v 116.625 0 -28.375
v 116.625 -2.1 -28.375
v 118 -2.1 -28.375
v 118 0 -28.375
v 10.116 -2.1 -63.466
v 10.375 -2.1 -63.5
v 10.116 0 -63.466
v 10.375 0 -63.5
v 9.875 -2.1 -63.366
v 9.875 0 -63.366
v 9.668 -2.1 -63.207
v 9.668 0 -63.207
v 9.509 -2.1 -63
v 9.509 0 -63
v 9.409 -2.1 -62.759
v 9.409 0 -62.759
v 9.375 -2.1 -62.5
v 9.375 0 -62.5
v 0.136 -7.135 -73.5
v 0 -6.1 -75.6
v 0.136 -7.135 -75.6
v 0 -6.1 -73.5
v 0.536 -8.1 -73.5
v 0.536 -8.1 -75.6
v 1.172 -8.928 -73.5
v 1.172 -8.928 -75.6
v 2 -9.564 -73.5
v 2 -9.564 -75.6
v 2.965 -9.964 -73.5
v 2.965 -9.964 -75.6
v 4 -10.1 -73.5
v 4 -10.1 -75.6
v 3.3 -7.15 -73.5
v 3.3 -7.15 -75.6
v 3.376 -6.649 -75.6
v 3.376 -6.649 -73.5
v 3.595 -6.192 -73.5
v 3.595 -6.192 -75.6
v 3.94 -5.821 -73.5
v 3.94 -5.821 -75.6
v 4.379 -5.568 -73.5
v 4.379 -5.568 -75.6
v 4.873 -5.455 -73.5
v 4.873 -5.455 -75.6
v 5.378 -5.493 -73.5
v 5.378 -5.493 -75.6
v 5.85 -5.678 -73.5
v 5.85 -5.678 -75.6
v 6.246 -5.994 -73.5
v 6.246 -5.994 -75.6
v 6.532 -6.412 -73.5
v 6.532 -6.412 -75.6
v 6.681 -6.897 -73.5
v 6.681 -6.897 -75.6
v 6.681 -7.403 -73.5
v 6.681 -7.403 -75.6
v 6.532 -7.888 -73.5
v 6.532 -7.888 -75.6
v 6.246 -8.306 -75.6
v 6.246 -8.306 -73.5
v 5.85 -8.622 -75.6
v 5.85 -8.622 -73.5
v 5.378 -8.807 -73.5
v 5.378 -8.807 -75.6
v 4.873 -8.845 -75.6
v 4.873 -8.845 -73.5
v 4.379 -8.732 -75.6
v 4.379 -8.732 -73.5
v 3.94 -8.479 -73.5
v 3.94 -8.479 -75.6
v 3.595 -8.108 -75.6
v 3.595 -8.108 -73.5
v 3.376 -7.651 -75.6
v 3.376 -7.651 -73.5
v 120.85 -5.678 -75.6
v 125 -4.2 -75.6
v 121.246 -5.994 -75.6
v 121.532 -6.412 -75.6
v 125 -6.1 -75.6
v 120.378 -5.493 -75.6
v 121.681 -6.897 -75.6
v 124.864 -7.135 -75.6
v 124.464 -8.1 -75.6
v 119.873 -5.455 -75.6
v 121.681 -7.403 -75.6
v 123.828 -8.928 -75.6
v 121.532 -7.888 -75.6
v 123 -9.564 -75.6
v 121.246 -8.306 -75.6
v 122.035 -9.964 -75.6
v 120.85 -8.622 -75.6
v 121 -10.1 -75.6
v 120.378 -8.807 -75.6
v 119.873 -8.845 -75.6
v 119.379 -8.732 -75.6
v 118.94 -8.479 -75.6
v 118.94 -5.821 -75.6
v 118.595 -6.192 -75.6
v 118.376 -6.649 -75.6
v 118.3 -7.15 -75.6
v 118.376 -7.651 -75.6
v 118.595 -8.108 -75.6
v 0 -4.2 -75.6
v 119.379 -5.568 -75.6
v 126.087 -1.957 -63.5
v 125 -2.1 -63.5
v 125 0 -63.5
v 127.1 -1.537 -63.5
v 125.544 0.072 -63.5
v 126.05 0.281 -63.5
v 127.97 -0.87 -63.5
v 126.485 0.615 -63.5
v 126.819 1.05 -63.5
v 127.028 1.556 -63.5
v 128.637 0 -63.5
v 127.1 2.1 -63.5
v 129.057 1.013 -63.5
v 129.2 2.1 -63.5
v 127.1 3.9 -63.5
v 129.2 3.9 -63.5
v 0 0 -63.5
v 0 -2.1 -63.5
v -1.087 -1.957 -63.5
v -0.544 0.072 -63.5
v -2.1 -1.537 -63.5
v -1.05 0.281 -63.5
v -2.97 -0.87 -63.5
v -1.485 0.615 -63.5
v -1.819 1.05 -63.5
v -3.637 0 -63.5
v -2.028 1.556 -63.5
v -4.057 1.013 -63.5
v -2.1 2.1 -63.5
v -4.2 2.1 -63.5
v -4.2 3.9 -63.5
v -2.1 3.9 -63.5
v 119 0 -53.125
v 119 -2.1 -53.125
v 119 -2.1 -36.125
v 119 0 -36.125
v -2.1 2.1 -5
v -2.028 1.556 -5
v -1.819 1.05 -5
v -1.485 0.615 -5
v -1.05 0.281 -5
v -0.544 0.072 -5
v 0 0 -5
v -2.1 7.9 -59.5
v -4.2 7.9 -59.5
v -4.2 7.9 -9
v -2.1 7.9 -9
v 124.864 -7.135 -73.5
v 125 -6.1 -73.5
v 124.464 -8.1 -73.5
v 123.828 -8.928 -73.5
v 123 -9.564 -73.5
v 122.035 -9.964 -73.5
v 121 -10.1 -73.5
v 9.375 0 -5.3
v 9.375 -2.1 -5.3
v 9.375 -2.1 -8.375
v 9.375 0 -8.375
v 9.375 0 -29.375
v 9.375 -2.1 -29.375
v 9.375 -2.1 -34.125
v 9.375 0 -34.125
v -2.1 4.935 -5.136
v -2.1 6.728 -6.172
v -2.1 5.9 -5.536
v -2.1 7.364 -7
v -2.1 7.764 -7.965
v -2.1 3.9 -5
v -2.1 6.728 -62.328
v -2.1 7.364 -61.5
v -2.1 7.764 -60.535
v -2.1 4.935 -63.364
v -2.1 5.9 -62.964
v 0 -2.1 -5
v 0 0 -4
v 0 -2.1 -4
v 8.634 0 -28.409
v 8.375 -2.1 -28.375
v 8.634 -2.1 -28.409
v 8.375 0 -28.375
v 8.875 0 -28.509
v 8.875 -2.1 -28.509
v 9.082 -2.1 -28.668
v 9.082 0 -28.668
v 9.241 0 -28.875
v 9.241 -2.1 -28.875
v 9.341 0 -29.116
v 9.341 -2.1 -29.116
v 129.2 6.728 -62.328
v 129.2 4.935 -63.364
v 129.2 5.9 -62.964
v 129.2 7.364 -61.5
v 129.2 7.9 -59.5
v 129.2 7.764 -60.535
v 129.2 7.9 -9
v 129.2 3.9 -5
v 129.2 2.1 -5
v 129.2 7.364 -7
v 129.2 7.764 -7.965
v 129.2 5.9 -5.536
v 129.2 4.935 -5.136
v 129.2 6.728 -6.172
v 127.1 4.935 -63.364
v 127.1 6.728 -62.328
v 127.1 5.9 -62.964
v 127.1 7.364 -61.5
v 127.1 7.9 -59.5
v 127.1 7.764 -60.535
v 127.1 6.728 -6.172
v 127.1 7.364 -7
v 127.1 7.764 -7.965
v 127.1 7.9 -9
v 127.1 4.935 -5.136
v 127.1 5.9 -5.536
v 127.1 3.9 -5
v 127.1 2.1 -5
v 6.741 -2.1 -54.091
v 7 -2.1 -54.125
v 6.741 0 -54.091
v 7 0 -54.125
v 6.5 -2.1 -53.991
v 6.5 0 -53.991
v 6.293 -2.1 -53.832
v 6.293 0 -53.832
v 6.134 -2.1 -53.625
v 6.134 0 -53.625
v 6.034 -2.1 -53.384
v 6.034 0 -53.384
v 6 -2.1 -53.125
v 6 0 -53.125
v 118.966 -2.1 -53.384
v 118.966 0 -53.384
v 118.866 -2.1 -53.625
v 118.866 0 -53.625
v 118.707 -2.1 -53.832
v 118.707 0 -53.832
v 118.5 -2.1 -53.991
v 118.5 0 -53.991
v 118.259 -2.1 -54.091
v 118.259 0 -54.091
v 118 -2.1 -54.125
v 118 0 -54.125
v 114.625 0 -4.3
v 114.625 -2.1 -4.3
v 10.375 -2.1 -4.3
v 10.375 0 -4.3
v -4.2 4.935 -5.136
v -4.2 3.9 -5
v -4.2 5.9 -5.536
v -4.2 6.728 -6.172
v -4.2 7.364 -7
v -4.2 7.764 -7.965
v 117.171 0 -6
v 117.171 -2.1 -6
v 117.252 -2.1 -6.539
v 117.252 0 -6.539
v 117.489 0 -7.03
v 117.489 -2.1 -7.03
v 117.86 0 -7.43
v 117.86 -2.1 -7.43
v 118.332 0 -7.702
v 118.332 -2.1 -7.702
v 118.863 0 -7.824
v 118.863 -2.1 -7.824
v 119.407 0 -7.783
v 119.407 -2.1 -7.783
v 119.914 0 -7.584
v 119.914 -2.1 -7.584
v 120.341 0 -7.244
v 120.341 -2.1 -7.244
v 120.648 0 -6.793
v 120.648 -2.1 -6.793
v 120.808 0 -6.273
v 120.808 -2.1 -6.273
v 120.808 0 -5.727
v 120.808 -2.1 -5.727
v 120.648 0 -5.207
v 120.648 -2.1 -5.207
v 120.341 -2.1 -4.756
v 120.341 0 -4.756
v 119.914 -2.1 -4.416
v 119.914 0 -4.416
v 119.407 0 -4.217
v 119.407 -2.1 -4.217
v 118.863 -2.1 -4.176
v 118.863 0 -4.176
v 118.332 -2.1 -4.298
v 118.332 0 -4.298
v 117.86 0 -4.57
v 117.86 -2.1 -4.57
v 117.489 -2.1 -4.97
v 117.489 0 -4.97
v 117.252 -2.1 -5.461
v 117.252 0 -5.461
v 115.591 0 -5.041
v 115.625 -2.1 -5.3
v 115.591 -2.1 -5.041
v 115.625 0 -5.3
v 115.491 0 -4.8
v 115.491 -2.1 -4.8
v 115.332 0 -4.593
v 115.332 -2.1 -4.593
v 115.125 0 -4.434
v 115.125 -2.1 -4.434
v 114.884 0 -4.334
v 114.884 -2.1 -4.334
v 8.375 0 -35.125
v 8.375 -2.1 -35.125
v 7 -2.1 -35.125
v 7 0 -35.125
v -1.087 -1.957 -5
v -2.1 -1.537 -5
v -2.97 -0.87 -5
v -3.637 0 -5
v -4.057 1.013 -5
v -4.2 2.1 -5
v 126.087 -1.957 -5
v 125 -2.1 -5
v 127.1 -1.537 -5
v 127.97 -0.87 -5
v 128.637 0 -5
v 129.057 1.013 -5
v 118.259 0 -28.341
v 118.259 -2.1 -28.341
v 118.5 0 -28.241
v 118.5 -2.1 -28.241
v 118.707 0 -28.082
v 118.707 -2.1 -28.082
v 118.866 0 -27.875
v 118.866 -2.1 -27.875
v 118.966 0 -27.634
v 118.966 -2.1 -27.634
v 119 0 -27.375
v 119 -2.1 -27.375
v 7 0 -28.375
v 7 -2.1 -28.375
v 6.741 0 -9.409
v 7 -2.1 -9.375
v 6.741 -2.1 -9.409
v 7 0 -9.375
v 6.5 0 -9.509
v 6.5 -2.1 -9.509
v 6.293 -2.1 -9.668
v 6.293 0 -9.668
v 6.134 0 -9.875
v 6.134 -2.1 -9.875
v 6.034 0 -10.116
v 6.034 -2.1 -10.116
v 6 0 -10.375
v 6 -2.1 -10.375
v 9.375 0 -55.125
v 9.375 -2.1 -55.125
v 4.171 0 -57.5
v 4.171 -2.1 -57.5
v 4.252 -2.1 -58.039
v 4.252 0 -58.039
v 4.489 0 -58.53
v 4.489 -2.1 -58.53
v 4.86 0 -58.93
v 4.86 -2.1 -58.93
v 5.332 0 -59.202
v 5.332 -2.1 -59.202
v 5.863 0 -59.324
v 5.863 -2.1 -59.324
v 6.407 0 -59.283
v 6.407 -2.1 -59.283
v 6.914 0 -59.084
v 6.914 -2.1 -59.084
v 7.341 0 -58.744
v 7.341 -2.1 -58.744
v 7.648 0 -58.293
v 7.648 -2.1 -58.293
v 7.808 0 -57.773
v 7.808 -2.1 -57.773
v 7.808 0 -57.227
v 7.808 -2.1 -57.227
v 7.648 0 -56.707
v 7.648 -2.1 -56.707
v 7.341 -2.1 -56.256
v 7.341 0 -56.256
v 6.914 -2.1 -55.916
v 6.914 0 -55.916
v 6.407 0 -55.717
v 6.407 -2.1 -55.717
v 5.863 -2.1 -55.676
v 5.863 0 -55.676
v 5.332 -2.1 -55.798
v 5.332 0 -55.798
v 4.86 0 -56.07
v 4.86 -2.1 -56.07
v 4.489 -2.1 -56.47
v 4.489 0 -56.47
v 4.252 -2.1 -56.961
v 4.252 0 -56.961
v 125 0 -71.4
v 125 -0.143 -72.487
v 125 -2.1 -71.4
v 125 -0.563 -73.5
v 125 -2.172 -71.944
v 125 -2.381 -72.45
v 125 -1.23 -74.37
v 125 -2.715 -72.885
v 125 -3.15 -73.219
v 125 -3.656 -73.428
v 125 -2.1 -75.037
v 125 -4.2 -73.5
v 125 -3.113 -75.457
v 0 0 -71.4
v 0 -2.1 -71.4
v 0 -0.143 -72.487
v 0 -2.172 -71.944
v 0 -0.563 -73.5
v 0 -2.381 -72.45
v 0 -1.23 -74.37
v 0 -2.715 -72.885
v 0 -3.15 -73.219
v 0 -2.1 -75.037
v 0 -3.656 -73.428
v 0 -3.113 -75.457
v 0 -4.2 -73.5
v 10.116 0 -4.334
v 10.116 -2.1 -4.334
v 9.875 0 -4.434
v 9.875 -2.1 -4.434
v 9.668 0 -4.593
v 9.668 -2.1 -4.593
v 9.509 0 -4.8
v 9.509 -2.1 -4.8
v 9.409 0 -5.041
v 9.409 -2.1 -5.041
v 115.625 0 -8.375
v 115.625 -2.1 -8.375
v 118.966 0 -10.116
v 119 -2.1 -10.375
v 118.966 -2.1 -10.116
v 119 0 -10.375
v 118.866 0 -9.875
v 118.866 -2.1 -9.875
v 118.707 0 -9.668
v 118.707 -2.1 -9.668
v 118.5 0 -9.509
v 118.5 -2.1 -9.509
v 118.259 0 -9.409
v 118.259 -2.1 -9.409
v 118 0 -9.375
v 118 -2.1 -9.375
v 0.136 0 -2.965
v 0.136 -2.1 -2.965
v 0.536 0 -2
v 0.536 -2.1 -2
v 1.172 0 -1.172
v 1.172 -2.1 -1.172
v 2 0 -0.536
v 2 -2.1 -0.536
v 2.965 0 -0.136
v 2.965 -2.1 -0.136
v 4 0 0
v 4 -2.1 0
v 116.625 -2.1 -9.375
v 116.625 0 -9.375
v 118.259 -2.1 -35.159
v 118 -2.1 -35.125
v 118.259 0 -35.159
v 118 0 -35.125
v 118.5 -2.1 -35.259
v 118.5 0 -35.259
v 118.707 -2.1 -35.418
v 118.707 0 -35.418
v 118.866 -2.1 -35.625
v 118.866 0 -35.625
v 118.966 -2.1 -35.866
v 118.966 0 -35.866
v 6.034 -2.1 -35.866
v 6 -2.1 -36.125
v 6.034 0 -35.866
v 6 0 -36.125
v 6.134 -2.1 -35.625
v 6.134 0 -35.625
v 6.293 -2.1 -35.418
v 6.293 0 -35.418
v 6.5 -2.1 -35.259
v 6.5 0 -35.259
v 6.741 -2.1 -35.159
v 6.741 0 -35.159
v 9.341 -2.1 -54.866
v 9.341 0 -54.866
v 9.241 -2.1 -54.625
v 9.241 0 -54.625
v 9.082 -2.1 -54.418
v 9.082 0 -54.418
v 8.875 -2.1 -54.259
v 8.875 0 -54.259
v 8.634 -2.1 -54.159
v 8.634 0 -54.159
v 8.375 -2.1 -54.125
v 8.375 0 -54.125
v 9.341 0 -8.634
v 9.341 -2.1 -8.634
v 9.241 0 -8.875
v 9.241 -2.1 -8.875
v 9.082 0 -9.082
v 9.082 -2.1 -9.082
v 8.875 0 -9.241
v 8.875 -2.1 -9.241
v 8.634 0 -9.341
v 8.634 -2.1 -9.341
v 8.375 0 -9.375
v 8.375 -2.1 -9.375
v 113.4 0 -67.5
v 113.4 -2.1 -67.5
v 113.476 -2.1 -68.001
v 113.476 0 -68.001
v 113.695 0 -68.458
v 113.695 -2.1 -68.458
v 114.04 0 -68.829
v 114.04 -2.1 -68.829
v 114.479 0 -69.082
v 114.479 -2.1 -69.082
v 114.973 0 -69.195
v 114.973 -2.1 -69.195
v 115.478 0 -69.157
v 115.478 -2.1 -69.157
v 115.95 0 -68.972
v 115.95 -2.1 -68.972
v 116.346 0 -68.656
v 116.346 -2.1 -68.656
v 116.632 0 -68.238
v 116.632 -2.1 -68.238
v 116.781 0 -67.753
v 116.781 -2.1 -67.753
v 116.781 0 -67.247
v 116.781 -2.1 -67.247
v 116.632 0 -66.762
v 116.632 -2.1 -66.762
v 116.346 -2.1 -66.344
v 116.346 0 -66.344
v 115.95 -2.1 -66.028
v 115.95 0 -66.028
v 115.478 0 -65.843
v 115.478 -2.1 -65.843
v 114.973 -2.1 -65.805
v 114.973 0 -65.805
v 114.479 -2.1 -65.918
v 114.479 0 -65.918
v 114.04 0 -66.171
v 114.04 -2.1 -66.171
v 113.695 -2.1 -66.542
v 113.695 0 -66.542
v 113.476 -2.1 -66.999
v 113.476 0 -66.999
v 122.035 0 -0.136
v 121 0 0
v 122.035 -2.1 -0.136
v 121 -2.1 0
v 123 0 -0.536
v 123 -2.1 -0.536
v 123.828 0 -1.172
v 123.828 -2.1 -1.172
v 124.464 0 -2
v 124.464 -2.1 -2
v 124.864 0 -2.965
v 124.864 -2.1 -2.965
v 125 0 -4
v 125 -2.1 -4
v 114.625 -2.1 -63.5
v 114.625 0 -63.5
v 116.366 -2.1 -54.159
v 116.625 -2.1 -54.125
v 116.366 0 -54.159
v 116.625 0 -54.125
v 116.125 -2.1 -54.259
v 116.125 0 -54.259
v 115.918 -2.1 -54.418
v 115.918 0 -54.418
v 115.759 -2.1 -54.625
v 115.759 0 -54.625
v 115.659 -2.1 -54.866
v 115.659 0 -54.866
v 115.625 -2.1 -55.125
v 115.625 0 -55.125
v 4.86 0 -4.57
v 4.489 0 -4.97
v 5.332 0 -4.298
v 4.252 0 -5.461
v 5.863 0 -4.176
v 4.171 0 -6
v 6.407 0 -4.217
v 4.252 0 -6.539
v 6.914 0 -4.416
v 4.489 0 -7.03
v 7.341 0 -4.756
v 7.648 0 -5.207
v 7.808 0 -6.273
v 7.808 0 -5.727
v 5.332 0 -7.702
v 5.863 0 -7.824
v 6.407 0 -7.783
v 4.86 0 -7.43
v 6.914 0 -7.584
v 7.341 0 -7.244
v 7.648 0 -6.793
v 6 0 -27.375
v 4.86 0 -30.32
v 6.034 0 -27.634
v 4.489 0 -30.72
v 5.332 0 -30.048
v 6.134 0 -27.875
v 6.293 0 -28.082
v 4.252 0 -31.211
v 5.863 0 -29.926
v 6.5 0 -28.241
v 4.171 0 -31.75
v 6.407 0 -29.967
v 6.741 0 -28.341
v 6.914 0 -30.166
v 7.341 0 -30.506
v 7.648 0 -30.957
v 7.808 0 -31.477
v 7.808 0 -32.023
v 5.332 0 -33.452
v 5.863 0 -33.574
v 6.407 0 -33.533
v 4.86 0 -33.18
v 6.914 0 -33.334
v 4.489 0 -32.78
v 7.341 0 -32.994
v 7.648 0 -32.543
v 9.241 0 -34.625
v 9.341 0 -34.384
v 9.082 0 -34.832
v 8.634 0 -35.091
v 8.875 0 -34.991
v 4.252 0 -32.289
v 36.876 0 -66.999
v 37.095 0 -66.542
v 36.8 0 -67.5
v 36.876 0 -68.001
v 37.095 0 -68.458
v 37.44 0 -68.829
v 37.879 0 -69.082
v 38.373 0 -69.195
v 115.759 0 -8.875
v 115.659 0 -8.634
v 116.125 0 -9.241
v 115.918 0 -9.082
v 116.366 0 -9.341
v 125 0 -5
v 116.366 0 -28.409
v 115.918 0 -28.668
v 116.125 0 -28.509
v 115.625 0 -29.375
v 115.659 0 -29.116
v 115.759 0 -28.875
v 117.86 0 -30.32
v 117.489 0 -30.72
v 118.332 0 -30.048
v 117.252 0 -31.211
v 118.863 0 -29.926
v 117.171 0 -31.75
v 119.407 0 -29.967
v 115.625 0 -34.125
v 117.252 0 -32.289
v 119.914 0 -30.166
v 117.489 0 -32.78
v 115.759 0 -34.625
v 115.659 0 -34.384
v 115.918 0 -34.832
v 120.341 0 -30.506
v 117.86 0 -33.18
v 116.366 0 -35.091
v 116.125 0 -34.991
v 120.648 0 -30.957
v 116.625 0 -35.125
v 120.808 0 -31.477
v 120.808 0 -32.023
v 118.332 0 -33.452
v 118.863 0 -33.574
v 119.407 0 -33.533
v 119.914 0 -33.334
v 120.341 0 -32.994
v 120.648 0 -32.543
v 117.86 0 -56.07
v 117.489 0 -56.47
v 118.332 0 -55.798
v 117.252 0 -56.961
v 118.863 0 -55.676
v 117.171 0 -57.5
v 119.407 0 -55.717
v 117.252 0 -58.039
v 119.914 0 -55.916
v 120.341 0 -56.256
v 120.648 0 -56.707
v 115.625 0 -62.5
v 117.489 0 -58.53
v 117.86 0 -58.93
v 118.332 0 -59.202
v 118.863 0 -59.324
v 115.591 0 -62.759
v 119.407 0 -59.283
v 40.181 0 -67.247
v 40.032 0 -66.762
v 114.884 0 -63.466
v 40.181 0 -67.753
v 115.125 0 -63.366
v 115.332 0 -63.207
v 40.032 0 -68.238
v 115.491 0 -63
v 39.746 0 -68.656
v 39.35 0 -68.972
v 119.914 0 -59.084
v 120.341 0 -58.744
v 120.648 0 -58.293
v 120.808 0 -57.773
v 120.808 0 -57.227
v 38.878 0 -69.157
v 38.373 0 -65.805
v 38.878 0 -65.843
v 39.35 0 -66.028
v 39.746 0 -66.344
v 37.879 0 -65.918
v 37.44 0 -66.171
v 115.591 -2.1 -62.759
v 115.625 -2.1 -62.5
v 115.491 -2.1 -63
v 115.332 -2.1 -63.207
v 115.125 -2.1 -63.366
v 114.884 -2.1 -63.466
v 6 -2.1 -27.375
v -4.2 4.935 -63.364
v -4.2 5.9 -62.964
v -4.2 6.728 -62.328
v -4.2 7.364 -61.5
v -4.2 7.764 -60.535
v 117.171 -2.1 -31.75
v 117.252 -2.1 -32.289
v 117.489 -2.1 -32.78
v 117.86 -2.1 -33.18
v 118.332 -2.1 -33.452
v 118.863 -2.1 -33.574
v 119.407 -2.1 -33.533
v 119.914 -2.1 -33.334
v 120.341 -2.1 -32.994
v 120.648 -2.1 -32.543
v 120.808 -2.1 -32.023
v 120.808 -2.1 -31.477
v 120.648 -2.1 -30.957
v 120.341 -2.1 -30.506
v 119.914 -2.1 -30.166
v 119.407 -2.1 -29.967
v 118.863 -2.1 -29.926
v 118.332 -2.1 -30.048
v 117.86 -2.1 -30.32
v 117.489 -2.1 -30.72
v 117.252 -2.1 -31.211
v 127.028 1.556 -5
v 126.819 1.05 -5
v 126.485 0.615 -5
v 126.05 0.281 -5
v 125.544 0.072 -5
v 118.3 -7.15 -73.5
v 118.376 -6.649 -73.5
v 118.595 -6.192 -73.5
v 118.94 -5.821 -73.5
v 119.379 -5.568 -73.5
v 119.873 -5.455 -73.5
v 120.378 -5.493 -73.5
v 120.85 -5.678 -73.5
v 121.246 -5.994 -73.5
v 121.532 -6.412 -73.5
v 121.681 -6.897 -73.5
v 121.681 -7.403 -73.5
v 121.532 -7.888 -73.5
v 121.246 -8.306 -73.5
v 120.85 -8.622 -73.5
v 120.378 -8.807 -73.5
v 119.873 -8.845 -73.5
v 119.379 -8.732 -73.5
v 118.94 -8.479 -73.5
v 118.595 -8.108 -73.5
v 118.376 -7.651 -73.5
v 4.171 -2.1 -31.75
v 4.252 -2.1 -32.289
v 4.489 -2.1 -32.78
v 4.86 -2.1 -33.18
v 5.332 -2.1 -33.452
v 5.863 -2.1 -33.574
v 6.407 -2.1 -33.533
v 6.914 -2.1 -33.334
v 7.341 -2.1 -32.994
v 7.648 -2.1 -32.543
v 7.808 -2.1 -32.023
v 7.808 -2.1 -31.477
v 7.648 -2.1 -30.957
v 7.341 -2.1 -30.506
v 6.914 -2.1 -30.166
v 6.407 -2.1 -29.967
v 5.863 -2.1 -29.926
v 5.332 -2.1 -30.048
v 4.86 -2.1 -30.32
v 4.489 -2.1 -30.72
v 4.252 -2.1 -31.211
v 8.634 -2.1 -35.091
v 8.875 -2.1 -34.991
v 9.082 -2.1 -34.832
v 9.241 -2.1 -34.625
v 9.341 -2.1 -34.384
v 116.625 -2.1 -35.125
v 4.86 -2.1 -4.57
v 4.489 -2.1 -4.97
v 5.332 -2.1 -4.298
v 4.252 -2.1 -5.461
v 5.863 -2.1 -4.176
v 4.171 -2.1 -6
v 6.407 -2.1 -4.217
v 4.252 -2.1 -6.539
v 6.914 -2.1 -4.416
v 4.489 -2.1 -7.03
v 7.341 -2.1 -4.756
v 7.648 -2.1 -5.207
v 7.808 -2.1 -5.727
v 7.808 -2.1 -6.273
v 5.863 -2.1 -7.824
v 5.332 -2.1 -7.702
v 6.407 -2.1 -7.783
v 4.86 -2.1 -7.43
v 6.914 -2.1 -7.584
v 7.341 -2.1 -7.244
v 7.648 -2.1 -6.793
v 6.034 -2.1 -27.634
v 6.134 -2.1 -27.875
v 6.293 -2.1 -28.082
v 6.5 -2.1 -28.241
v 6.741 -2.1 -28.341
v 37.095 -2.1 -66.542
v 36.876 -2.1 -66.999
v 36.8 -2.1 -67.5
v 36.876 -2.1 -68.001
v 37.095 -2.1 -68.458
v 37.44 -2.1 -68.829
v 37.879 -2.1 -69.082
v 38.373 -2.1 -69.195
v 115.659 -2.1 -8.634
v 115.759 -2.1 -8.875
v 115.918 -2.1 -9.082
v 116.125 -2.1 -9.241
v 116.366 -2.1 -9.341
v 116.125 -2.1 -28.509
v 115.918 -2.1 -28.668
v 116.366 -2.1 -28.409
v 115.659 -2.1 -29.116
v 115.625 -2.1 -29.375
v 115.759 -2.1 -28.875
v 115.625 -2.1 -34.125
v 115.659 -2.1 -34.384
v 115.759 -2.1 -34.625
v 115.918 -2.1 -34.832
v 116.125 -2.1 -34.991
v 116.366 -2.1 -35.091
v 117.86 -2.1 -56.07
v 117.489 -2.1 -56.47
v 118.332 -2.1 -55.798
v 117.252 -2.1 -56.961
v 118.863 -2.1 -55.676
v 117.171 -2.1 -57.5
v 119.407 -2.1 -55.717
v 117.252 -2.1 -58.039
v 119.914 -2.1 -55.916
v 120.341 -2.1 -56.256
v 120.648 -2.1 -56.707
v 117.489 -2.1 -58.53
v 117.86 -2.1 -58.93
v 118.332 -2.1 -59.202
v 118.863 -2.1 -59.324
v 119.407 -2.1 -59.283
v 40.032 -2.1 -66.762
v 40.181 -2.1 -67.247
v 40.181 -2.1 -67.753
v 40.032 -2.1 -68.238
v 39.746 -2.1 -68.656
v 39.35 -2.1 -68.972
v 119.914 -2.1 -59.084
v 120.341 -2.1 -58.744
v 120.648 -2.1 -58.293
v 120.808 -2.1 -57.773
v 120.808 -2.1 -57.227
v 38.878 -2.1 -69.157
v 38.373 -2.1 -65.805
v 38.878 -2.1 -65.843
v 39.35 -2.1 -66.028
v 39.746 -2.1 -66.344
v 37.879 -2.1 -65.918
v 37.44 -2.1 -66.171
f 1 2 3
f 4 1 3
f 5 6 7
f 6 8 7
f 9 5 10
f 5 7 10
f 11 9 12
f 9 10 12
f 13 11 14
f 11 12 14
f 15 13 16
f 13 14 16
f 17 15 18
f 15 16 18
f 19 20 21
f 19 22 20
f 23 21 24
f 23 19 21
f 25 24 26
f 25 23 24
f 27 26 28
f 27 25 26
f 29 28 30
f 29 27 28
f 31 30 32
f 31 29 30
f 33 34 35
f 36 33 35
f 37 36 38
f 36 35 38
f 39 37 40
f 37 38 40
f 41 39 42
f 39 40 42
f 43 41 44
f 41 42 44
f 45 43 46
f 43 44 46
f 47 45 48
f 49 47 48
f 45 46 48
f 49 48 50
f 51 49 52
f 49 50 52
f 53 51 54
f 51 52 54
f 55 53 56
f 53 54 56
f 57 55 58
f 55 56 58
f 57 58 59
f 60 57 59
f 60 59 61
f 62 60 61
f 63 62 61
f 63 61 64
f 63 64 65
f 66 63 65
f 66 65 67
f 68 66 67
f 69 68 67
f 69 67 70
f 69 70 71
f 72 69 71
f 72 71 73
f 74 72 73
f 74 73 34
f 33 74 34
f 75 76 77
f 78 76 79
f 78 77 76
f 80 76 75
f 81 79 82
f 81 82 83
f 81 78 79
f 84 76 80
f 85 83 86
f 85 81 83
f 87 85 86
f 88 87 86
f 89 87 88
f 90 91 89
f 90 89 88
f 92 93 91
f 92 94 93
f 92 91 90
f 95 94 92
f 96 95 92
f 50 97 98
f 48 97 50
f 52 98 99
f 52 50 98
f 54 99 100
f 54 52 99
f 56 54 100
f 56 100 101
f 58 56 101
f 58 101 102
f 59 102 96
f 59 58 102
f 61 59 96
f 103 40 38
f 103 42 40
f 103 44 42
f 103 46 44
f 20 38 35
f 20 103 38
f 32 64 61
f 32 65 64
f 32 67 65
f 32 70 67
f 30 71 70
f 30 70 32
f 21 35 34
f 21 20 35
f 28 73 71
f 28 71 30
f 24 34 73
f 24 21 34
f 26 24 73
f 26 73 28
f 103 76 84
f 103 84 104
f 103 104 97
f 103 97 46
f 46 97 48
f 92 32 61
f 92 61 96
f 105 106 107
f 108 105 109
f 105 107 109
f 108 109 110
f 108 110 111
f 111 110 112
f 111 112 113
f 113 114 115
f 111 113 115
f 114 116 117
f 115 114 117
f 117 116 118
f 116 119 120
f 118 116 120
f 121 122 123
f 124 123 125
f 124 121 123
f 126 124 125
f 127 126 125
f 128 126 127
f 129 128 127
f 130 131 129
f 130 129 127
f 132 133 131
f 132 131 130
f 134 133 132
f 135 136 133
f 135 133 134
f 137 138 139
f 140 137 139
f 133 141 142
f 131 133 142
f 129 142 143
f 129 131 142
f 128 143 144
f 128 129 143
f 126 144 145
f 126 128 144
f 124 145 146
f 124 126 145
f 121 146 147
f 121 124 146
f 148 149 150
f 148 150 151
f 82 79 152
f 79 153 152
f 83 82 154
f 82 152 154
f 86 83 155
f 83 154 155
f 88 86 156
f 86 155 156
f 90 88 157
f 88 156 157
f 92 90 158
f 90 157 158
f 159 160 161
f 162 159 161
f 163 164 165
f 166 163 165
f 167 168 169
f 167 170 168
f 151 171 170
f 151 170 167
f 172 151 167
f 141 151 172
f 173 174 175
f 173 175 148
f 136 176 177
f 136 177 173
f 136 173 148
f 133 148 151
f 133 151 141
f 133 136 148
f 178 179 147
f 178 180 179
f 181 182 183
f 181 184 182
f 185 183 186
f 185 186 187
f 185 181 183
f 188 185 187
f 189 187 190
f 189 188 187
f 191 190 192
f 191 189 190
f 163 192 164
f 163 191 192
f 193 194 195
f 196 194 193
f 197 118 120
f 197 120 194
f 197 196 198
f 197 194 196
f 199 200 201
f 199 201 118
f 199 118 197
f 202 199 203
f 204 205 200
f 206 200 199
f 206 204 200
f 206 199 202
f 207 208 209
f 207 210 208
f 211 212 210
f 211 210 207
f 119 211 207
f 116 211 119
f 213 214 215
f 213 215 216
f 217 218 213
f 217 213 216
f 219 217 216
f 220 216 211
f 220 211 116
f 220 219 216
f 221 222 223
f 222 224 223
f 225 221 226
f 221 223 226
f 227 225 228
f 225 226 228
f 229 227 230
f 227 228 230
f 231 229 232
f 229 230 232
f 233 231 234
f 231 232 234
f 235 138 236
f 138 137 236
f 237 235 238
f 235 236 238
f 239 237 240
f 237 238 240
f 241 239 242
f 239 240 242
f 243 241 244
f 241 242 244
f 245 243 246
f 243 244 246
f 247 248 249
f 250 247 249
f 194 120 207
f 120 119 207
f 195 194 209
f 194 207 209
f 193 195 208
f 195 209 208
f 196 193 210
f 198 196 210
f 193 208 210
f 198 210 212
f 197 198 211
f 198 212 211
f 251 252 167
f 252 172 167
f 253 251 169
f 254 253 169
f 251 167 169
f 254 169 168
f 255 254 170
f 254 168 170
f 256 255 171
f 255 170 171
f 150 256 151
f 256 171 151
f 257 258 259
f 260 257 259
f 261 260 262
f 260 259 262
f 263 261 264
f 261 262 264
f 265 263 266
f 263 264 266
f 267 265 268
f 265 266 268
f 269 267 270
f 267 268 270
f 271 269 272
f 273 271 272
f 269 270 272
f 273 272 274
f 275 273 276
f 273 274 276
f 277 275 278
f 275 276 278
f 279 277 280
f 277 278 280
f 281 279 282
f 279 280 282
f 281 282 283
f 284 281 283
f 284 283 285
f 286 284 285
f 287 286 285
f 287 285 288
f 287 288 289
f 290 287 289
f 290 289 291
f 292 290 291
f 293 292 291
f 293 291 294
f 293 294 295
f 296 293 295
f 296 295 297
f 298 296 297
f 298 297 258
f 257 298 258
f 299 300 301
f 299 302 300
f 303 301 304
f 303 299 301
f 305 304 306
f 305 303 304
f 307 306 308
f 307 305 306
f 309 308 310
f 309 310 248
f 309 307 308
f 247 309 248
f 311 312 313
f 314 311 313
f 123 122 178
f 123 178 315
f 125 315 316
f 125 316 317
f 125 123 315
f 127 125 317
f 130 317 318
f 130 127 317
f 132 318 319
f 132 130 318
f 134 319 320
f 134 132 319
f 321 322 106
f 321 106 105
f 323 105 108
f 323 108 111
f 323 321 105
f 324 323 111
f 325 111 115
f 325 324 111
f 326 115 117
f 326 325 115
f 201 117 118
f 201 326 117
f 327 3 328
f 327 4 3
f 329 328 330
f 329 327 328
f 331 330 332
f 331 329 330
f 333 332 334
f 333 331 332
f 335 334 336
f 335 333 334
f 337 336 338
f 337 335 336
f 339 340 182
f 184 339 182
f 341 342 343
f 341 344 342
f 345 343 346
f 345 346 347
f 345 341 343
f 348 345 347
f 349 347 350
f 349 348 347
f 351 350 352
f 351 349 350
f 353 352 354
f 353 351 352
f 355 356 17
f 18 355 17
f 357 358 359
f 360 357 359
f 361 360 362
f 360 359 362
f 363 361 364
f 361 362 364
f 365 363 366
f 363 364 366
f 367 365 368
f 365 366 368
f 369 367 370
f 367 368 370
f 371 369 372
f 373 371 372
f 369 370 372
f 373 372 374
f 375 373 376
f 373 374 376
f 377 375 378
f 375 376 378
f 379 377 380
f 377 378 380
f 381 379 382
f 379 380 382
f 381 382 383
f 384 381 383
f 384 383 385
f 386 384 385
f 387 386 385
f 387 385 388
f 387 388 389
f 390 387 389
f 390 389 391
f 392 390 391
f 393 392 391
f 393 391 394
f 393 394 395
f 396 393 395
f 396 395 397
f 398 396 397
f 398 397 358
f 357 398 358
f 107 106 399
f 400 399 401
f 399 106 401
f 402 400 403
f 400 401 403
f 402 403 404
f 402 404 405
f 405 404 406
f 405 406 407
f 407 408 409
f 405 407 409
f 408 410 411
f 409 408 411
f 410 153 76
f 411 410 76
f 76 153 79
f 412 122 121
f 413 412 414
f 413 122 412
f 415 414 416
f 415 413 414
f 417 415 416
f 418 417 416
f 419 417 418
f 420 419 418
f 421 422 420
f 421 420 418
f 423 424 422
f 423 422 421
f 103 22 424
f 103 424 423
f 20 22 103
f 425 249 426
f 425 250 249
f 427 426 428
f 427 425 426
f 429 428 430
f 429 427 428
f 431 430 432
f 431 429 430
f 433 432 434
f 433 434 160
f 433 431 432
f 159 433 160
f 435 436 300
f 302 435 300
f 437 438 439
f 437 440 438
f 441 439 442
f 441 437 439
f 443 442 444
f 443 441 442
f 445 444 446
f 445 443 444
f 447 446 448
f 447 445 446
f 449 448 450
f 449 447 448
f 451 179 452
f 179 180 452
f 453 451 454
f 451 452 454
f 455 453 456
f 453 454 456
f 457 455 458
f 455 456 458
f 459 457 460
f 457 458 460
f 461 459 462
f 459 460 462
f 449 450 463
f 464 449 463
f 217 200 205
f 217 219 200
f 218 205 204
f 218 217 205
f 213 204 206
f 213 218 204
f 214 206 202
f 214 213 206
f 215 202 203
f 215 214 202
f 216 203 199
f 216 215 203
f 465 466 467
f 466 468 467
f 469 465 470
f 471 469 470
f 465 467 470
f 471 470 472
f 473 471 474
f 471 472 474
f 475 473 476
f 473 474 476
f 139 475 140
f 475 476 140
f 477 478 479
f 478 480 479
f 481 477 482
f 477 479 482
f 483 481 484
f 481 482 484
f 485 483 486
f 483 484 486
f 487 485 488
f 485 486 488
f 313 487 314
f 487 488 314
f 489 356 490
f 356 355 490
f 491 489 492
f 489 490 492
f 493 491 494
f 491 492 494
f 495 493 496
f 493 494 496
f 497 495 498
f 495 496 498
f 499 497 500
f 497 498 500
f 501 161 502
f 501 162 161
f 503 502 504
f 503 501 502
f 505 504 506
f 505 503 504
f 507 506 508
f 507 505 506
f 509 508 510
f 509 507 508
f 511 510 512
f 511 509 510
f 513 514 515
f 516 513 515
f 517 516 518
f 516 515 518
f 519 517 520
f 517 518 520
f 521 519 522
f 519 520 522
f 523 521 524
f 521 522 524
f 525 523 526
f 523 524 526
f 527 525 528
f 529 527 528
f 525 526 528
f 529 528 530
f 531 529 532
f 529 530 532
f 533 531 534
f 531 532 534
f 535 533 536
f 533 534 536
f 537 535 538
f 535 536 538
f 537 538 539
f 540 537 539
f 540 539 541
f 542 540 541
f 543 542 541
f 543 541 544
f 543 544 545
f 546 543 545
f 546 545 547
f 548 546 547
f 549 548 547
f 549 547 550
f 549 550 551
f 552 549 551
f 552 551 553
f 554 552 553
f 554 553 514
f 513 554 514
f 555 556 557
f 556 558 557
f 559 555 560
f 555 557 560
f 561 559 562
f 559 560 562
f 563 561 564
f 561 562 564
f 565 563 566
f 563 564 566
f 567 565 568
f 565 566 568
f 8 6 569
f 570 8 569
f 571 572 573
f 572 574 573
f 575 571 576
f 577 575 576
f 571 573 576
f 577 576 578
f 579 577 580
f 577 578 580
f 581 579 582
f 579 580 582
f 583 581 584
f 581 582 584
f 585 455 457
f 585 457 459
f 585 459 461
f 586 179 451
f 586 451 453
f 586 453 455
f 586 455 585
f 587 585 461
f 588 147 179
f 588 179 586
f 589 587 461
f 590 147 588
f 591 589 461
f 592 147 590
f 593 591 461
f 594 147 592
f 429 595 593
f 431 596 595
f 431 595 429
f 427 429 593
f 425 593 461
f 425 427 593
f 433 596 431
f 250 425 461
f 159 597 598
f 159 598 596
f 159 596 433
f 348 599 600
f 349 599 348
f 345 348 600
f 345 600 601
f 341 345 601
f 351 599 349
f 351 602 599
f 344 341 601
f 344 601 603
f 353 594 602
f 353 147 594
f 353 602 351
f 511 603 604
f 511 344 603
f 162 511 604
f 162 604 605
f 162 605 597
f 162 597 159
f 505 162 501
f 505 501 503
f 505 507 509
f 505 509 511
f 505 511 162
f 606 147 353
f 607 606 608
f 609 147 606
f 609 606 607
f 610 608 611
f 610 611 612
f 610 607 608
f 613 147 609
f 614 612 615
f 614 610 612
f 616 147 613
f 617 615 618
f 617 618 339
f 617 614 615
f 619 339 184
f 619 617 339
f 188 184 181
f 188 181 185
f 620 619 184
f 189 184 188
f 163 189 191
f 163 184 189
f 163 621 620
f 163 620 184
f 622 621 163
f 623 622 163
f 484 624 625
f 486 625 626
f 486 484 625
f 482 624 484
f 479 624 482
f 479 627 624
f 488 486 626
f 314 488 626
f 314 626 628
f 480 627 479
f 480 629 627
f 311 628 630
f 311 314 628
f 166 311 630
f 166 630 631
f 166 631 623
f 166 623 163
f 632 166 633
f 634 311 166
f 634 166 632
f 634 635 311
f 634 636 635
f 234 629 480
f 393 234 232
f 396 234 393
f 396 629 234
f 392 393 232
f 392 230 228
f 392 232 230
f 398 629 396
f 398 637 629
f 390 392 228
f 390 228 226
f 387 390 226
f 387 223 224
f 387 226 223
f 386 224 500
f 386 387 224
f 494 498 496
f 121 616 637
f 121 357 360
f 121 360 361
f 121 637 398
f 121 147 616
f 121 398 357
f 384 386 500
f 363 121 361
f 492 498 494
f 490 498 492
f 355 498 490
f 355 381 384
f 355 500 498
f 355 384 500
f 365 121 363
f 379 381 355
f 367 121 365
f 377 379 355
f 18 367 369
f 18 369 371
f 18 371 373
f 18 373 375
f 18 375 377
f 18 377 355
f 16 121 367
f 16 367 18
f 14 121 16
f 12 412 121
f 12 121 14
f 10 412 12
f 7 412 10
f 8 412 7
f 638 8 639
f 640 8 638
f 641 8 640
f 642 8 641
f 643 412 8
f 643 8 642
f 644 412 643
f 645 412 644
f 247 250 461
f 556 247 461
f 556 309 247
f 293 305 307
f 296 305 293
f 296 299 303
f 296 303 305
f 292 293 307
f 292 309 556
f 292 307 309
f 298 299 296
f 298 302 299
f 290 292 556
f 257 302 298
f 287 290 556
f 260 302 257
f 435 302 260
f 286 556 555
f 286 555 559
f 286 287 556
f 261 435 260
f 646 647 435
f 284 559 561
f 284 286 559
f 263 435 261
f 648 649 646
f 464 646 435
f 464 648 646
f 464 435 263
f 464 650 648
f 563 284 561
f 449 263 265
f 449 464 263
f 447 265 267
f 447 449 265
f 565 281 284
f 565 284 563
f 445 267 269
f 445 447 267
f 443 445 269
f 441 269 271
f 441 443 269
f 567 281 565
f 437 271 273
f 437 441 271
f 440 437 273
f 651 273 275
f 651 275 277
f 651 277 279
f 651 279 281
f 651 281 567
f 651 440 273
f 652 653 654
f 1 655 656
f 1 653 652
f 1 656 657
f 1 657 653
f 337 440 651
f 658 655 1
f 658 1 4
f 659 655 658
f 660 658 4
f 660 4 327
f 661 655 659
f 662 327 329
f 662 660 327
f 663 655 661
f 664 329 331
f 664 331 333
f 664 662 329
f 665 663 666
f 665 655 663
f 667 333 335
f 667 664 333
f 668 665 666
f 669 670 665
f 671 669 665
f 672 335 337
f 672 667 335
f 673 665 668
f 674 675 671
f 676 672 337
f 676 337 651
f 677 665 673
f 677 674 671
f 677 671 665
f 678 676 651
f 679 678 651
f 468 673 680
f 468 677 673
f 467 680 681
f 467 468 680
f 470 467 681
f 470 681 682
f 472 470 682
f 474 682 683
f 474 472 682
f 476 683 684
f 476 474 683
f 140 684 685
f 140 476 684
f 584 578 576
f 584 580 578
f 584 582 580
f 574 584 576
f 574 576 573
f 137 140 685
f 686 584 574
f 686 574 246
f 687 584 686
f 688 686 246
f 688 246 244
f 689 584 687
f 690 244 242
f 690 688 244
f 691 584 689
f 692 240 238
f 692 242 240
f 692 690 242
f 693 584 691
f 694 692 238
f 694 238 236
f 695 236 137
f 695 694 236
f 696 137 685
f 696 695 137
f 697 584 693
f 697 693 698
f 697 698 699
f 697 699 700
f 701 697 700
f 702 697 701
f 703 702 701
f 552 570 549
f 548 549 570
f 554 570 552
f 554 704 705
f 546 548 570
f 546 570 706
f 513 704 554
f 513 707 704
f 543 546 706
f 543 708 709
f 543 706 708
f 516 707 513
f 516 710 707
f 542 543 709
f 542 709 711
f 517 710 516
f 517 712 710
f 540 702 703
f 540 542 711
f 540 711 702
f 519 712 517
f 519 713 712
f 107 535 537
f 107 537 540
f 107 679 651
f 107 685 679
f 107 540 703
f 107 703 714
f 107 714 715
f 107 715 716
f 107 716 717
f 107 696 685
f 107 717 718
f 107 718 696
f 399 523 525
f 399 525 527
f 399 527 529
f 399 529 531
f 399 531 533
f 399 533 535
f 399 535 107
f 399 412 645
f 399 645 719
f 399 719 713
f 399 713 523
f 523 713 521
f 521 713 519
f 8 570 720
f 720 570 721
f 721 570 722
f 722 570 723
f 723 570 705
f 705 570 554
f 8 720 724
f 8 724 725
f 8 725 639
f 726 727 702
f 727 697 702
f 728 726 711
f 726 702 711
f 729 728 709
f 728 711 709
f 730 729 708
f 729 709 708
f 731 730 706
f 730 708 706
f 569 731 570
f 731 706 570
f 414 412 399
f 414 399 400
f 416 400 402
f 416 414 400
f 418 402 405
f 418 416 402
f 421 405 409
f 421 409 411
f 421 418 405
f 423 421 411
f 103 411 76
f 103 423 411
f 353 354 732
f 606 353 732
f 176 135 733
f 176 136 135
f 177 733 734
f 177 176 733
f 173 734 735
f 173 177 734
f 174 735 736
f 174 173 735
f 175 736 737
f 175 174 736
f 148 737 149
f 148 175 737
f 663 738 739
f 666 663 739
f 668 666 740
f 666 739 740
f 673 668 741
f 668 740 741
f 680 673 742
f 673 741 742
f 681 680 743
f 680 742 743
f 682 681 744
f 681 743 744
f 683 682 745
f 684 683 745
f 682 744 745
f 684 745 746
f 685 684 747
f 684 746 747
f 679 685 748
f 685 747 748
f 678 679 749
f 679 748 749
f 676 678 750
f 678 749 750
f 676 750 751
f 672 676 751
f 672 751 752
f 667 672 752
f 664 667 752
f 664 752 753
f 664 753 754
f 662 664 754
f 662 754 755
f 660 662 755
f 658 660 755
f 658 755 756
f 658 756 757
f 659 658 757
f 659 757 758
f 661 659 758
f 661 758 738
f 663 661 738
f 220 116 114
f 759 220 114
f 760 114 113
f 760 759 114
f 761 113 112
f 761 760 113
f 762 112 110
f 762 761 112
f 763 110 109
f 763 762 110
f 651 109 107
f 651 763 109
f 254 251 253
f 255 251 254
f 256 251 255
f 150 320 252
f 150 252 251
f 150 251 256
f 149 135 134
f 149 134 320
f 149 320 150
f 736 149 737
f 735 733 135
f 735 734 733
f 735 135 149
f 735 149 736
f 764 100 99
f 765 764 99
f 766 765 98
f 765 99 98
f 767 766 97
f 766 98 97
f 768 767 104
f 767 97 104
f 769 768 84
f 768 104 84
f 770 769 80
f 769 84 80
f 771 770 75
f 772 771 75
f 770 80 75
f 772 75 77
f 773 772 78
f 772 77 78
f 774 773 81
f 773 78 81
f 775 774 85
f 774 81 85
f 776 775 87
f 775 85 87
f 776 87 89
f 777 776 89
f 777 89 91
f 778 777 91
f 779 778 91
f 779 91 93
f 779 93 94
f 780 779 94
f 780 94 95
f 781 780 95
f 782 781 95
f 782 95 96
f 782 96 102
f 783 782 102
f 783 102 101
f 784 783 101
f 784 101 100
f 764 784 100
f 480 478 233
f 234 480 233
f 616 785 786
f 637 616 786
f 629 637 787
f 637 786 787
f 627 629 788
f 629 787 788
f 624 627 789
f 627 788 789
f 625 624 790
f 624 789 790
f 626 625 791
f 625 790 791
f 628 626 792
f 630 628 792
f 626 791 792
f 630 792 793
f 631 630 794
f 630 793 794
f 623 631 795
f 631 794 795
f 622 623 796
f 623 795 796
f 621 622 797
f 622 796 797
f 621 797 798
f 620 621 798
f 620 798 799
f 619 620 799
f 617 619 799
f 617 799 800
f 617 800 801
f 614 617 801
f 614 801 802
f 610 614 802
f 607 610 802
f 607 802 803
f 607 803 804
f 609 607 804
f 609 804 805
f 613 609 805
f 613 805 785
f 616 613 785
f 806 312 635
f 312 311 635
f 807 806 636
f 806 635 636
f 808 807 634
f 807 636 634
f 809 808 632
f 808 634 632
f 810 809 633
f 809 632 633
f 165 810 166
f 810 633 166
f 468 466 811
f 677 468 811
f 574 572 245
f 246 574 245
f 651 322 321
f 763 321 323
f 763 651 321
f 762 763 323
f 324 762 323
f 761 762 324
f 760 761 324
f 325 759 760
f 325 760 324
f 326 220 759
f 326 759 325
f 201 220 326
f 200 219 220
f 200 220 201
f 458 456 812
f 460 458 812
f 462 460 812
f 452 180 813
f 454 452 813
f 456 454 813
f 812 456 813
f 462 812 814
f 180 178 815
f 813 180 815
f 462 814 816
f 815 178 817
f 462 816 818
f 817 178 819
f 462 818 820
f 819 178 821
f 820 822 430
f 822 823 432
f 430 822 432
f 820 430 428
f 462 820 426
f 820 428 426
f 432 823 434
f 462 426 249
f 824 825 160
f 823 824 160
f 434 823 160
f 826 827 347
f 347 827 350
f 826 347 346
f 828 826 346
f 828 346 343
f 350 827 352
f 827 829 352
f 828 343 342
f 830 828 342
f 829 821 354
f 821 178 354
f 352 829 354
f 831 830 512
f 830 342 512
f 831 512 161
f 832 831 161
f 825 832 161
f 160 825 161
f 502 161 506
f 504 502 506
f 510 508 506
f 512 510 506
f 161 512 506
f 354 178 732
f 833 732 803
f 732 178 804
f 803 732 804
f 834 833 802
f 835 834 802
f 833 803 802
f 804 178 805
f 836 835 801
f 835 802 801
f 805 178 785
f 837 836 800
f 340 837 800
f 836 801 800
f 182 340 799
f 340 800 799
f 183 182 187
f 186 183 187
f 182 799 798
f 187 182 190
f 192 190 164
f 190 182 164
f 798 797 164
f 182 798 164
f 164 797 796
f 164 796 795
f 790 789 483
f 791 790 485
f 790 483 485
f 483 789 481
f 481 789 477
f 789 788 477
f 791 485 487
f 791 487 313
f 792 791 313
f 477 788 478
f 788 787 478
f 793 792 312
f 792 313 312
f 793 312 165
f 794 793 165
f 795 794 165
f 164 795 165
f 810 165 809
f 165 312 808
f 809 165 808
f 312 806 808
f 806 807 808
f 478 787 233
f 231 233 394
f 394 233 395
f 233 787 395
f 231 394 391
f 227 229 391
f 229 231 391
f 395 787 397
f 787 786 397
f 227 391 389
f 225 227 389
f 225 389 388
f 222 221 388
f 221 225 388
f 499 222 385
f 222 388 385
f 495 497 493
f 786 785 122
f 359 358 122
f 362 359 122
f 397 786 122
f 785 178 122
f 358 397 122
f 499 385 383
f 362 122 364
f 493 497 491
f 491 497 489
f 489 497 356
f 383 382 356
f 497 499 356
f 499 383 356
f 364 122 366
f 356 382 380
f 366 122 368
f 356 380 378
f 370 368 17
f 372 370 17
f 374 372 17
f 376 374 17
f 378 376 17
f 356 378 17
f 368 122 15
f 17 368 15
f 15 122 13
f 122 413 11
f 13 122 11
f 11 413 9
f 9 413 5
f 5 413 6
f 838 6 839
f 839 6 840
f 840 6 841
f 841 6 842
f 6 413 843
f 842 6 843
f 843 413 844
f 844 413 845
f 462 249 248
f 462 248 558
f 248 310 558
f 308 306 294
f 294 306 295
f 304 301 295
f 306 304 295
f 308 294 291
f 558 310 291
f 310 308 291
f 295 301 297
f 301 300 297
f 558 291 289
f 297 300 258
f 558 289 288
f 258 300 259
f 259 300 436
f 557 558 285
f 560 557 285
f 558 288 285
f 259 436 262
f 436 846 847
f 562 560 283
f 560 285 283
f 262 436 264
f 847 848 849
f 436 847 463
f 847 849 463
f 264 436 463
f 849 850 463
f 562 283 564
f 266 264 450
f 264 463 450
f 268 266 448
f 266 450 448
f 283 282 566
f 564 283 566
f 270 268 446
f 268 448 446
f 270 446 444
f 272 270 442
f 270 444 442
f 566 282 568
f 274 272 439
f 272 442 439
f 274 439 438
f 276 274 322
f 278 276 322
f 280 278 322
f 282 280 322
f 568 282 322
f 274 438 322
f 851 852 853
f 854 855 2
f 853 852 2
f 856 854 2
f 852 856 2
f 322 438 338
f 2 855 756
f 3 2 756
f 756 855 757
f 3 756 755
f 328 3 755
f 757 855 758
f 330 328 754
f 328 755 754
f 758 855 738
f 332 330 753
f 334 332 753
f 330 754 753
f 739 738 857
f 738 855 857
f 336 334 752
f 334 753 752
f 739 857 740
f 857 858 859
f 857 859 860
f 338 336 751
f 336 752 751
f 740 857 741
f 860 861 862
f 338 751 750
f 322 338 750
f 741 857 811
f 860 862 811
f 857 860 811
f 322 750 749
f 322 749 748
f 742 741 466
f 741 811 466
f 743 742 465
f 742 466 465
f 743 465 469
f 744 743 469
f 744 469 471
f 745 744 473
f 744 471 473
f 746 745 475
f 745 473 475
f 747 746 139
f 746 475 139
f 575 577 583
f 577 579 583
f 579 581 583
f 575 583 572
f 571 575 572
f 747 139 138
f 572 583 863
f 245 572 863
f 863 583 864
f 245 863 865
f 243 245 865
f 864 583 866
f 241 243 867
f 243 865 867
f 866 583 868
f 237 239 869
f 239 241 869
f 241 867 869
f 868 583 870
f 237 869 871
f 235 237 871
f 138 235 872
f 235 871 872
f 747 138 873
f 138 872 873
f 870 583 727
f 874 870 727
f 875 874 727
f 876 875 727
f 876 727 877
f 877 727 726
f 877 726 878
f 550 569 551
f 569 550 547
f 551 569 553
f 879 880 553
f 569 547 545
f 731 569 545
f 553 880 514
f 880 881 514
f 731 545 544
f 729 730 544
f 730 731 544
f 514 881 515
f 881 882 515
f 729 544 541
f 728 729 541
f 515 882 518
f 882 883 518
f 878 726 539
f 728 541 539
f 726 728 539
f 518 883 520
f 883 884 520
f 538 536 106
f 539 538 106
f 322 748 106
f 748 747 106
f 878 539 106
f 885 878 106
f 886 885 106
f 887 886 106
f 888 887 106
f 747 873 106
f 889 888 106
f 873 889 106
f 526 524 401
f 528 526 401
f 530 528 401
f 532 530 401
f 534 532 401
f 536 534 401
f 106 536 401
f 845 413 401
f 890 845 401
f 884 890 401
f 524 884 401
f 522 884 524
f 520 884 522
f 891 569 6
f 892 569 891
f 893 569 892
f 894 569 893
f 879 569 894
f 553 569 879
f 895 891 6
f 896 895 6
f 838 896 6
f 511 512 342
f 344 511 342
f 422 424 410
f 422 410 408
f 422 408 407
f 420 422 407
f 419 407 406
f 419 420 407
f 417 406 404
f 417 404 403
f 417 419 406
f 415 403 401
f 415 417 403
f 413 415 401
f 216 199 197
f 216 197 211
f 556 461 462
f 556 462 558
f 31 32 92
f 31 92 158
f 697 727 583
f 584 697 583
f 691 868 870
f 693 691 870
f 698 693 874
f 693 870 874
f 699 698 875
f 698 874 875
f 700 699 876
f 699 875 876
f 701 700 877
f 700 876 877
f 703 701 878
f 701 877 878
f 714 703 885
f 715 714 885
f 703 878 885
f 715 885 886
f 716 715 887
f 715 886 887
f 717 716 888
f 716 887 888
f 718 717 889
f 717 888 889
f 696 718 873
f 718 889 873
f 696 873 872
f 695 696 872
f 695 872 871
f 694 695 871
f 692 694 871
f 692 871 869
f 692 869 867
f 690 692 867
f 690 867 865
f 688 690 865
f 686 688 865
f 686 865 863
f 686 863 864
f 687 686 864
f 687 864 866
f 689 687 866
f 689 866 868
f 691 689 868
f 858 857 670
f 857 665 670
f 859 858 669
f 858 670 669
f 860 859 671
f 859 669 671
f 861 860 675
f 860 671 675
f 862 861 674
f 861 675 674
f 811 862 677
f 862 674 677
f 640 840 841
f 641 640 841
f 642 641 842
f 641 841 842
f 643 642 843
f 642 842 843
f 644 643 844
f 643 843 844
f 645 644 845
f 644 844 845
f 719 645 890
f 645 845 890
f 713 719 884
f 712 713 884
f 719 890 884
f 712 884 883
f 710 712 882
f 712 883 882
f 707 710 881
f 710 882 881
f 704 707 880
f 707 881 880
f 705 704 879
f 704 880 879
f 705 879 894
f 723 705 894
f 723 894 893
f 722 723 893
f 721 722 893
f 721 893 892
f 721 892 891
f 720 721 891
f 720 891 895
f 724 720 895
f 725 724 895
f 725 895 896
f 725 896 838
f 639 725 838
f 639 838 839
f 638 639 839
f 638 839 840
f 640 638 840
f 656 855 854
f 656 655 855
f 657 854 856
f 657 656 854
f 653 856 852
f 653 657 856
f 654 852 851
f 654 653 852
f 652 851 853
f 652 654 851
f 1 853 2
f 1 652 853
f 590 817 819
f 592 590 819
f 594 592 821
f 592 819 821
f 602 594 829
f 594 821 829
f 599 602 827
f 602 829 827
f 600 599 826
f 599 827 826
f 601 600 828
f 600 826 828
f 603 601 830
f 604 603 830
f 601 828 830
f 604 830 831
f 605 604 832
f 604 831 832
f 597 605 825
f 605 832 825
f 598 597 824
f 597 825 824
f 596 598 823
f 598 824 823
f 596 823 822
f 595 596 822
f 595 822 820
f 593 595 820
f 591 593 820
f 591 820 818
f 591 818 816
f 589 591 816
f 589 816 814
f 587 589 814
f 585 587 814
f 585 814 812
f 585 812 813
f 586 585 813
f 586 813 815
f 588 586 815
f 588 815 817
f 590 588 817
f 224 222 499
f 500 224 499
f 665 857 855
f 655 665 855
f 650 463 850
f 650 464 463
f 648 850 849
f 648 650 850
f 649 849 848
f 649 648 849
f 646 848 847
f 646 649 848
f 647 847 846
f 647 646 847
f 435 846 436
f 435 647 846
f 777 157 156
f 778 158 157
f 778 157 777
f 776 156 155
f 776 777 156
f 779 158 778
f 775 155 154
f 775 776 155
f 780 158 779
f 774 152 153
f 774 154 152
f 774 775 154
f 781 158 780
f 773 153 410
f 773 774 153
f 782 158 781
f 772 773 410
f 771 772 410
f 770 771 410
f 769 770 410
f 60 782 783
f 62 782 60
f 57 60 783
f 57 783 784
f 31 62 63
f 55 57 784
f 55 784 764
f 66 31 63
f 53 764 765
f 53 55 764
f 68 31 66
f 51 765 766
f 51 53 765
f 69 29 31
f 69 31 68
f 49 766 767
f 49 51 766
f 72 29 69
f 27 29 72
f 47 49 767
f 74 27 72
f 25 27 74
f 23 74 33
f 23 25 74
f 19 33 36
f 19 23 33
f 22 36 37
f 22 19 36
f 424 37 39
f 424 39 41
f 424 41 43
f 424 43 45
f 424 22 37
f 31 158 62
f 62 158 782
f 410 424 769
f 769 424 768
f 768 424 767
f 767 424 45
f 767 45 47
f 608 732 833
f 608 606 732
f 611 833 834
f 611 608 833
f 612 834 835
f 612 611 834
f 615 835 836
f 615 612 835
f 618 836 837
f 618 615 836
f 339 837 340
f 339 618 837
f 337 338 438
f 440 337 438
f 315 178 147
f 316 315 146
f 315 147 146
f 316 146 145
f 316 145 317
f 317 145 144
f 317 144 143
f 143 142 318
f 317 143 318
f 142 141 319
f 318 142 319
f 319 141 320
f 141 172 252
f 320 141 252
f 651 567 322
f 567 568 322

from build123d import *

# Parameters (mm, degrees)
SKETCH1_W                    = 125
SKETCH1_H                    = 73.5
BASE_FLANGE1_DEPTH           = 2.1
EDGE_FLANGE1_STRIP_W         = 12.6
EDGE_FLANGE1_STRIP_H         = 2.1
EDGE_FLANGE1_STRIP_CUT_DEPTH = 125
EDGE_FLANGE1_DEPTH           = 125
CUT_EXTRUDE1_REACH           = 148.302
PSU_MOUNTING_HOLES_D         = 3.6576
FILLET1_R                    = 1
SSD_MOUNTING_HOLES_D         = 3.4
M3_CLEARANCE_HOLE1_D         = 3.4
EDGE_FLANGE2_DEPTH           = 58.5
EDGE_FLANGE2_BEND_DEPTH      = 58.5
FILLET2_R                    = 4


# Sheet-metal steps are written as plain solids
with BuildPart() as part:
    # Sketch1 → Base-Flange1 (new body)
    with BuildSketch(Plane(origin=(0, 0, 0), x_dir=(1, 0, 0), z_dir=(0, 1, 0))):
        with Locations((62.5, 36.75)):
            Rectangle(SKETCH1_W, SKETCH1_H)
    extrude(amount=-BASE_FLANGE1_DEPTH)

    # Edge-Flange1 strip (across the edge) → Edge-Flange1 strip cut (cut)
    with BuildSketch(Plane(origin=(0, -2.1, -73.5), x_dir=(0, 0, 1), z_dir=(1, 0, 0))):
        with Locations((-4.2, -1.05)):
            Rectangle(EDGE_FLANGE1_STRIP_W, EDGE_FLANGE1_STRIP_H)
    extrude(amount=EDGE_FLANGE1_STRIP_CUT_DEPTH, mode=Mode.SUBTRACT)

    # Edge-Flange1 section (across the edge) → Edge-Flange1 (add)
    with BuildSketch(Plane(origin=(0, -2.1, -73.5), x_dir=(0, 0, 1), z_dir=(1, 0, 0))):
        with BuildLine():
            Line((-2.1, 2.1), (-2.1, 8))
            Line((-2.1, 8), (0, 8))
            Line((0, 8), (0, 2.1))
            ThreePointArc((0, 2.1), (0.61507576, 0.61507576), (2.1, 0))
            Line((2.1, 0), (2.1, -2.1))
            ThreePointArc((2.1, -2.1), (-0.869848481, -0.869848481), (-2.1, 2.1))
        make_face()
    extrude(amount=EDGE_FLANGE1_DEPTH)

    # Sketch7 → Cut-Extrude1 (cut, up to next)
    with BuildSketch(Plane(origin=(0, -2.1, 0), x_dir=(-1, 0, 0), z_dir=(0, -1, 0)), mode=Mode.PRIVATE) as cut_extrude1_sk1:
        Polygon((-115.625, 28.375), (-119, 28.375), (-119, 9.375), (-115.625, 9.375), (-115.625, 4.3), (-9.375, 4.3), (-9.375, 9.375), (-6, 9.375), (-6, 28.375), (-9.375, 28.375), (-9.375, 35.125), (-6, 35.125), (-6, 54.125), (-9.375, 54.125), (-9.375, 63.5), (-115.625, 63.5), (-115.625, 54.125), (-119, 54.125), (-119, 35.125), (-115.625, 35.125), align=None)
    cut_extrude1_tool1 = extrude(cut_extrude1_sk1.sketch, amount=-CUT_EXTRUDE1_REACH, mode=Mode.PRIVATE) & part.part
    add(cut_extrude1_tool1.solids().sort_by_distance((62.5, -2.1, -33.81576))[0], mode=Mode.SUBTRACT)

    # psu-mounting-holes (through all)
    with Locations(Plane(origin=(0, 0, 0), x_dir=(1, 0, 0), z_dir=(0, 1, 0))):
        with Locations((119, 6), (119, 57.5), (6, 6), (6, 57.5), (6, 31.75), (119, 31.75)):
            Hole(PSU_MOUNTING_HOLES_D / 2)

    # Fillet1
    fillet1_edges = [part.edges().sort_by_distance(p)[0] for p in [
        (119, -1.05, -28.375),
        (115.625, -1.05, -28.375),
        (115.625, -1.05, -35.125),
        (119, -1.05, -35.125),
        (119, -1.05, -54.125),
        (115.625, -1.05, -54.125),
        (115.625, -1.05, -63.5),
        (9.375, -1.05, -63.5),
        (9.375, -1.05, -54.125),
        (6, -1.05, -54.125),
        (6, -1.05, -35.125),
        (9.375, -1.05, -35.125),
        (9.375, -1.05, -28.375),
        (6, -1.05, -28.375),
        (6, -1.05, -9.375),
        (9.375, -1.05, -9.375),
        (9.375, -1.05, -4.3),
        (115.625, -1.05, -4.3),
        (115.625, -1.05, -9.375),
        (119, -1.05, -9.375),
    ]]
    fillet(fillet1_edges, radius=FILLET1_R)

    # ssd-mounting-holes (through all)
    with Locations(Plane(origin=(0, 0, 0), x_dir=(1, 0, 0), z_dir=(0, 1, 0))):
        with Locations((115.1, 67.5), (38.5, 67.5)):
            Hole(SSD_MOUNTING_HOLES_D / 2)

    # M3 Clearance Hole1 (through all)
    with Locations(Plane.XY.offset(-73.5)):
        with Locations((120, -7.15), (5, -7.15)):
            Hole(M3_CLEARANCE_HOLE1_D / 2)

    # Edge-Flange2 section (across the edge) → Edge-Flange2 (add)
    with BuildSketch(Plane(origin=(127.1, 0, -5), x_dir=(-1, 0, 0), z_dir=(0, 0, -1))):
        with BuildLine():
            Line((-2.1, 2.1), (-2.1, 7.9))
            Line((-2.1, 7.9), (0, 7.9))
            Line((0, 7.9), (0, 2.1))
            ThreePointArc((0, 2.1), (0.61507576, 0.61507576), (2.1, 0))
            Line((2.1, 0), (2.1, -2.1))
            ThreePointArc((2.1, -2.1), (-0.869848481, -0.869848481), (-2.1, 2.1))
        make_face()
    extrude(amount=EDGE_FLANGE2_DEPTH)

    # Edge-Flange2 section 2 (across the edge) → Edge-Flange2 bend (add)
    with BuildSketch(Plane(origin=(-2.1, 0, -63.5), x_dir=(1, 0, 0), z_dir=(0, 0, 1))):
        with BuildLine():
            Line((-2.1, 2.1), (-2.1, 7.9))
            Line((-2.1, 7.9), (0, 7.9))
            Line((0, 7.9), (0, 2.1))
            ThreePointArc((0, 2.1), (0.61507576, 0.61507576), (2.1, 0))
            Line((2.1, 0), (2.1, -2.1))
            ThreePointArc((2.1, -2.1), (-0.869848481, -0.869848481), (-2.1, 2.1))
        make_face()
    extrude(amount=EDGE_FLANGE2_BEND_DEPTH)

    # Fillet2
    fillet2_edges = [part.edges().sort_by_distance(p)[0] for p in [
        (128.15, 7.9, -5),
        (128.15, 7.9, -63.5),
        (0, -10.1, -74.55),
        (-3.15, 7.9, -63.5),
        (-3.15, 7.9, -5),
        (125, -10.1, -74.55),
        (125, -1.05, 0),
        (0, -1.05, 0),
    ]]
    fillet(fillet2_edges, radius=FILLET2_R)


solid = part.part
